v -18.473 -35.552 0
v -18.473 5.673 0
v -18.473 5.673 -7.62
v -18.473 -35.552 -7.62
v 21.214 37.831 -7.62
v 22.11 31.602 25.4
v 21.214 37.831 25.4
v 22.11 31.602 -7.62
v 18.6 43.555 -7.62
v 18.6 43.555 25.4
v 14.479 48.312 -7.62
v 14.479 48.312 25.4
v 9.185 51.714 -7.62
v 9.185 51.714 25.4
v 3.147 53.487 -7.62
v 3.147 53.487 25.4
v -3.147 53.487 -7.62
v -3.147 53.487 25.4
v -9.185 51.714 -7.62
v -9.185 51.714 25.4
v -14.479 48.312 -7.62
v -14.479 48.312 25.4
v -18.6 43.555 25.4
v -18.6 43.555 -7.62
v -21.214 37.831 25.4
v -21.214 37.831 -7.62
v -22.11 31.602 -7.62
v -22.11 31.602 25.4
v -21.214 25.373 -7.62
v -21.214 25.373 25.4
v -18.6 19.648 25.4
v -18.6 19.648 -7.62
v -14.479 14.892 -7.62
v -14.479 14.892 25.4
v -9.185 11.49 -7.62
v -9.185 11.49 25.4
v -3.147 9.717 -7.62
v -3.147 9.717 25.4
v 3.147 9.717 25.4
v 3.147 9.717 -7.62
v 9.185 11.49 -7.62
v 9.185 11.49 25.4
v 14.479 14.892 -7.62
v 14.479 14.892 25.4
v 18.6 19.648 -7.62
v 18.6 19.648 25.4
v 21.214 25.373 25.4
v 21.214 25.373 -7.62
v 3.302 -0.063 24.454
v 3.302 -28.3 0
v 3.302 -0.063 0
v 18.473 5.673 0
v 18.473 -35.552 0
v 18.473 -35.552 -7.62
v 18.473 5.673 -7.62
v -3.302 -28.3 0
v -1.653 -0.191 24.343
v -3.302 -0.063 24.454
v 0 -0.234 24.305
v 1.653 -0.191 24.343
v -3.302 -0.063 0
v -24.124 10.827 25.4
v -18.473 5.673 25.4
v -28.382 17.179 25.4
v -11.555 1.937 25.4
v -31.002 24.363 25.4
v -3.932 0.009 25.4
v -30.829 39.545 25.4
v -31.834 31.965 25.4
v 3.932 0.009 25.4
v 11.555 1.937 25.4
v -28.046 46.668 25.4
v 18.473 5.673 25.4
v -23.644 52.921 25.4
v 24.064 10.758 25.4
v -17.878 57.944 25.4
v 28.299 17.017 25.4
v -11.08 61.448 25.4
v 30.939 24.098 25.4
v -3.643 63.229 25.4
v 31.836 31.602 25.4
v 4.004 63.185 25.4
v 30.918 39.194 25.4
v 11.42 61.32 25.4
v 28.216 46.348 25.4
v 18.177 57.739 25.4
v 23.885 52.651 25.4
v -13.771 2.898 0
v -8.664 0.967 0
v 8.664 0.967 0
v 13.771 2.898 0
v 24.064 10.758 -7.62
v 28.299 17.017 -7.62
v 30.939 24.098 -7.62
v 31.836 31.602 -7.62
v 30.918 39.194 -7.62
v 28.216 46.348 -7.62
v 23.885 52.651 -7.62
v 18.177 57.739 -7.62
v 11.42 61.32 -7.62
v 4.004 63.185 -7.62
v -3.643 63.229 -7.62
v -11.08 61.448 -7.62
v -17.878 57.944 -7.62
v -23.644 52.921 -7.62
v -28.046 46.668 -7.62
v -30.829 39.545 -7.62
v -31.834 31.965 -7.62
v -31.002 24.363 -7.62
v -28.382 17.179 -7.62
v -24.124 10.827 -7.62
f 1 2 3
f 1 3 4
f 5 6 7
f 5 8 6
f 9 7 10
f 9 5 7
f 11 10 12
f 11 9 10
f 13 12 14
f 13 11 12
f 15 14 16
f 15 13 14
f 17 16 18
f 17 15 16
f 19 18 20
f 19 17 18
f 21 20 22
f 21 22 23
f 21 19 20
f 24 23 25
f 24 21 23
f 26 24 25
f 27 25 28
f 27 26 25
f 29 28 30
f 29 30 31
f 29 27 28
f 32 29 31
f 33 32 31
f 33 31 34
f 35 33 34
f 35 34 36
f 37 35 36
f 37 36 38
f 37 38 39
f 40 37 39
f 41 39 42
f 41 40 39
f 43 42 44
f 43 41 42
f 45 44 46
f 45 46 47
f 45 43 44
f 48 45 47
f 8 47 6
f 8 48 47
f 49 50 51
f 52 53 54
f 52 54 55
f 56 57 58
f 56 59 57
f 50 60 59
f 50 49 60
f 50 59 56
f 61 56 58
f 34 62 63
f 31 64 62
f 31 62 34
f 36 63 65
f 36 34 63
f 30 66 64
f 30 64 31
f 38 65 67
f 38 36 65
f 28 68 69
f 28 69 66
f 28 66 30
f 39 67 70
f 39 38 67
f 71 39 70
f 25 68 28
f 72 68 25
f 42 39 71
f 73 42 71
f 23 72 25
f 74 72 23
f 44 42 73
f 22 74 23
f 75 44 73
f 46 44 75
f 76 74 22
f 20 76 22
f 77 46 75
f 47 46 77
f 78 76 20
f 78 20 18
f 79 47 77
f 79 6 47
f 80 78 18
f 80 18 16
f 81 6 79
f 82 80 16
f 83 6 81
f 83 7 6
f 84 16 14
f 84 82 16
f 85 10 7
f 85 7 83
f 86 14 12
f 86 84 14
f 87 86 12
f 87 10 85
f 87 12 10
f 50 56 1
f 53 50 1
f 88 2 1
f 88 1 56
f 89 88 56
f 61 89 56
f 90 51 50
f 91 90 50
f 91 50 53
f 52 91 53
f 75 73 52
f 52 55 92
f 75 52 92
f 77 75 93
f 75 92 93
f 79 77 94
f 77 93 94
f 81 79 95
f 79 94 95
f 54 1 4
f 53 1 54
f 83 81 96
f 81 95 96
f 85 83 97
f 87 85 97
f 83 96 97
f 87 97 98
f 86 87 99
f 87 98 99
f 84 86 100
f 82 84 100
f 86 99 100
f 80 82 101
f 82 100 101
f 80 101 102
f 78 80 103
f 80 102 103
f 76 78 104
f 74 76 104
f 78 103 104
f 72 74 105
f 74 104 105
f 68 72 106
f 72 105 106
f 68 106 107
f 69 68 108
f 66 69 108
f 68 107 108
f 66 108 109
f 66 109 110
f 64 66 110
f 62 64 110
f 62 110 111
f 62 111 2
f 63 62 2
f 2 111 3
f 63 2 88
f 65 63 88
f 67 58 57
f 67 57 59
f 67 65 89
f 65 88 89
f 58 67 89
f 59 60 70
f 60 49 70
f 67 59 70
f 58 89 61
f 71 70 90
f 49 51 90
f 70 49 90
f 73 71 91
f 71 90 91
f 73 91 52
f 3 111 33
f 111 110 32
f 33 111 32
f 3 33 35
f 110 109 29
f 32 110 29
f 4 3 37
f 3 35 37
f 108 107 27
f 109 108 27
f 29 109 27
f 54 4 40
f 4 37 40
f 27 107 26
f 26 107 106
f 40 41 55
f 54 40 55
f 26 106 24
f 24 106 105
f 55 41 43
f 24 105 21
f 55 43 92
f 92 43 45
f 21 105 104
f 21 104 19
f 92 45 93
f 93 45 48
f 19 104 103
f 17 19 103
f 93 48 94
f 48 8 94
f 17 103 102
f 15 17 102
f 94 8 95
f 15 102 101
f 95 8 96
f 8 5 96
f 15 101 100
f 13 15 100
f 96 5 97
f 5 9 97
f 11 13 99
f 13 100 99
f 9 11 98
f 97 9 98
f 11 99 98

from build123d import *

# Parameters (mm, degrees)
F0_R     = 22.110067
F1_DEPTH = 7.62
F2_DEPTH = 25.4
F4_DEPTH = 3.302


with BuildPart() as f1:
    # F0 (on Top) → F1 (new body)
    with BuildSketch(Plane.XY):
        with BuildLine():
            ThreePointArc((18.473424, 5.673436), (28.299088, 17.017198), (31.836316, 31.601869))
            ThreePointArc((31.836316, 31.601869), (-14.584671, 59.900956), (-18.473424, 5.673436))
            ThreePointArc((-18.473424, 5.673436), (0, -0.234447), (18.473424, 5.673436))
        make_face()
        with Locations((0, 31.601869)):
            Circle(F0_R, mode=Mode.SUBTRACT)
        with BuildLine():
            ThreePointArc((18.473424, 5.673436), (0, -0.234447), (-18.473424, 5.673436))
            Line((-18.473424, 5.673436), (-18.473424, -35.552085))
            Line((-18.473424, -35.552085), (0, -35.552085))
            Line((0, -35.552085), (18.473424, -35.552085))
            Line((18.473424, -35.552085), (18.473424, 5.673436))
        make_face()
    extrude(amount=-F1_DEPTH)

    # F0 (on Top) → F2 (join)
    with BuildSketch(Plane.XY):
        with BuildLine():
            ThreePointArc((18.473424, 5.673436), (28.299088, 17.017198), (31.836316, 31.601869))
            ThreePointArc((31.836316, 31.601869), (-14.584671, 59.900956), (-18.473424, 5.673436))
            ThreePointArc((-18.473424, 5.673436), (0, -0.234447), (18.473424, 5.673436))
        make_face()
        with Locations((0, 31.601869)):
            Circle(F0_R, mode=Mode.SUBTRACT)
    extrude(amount=F2_DEPTH)

    # F3 (on Right) → F4 (join, symmetric)
    with BuildSketch(Plane.YZ):
        Polygon((0, 24.508493), (-28.300449, 0), (3.349552, 0), (3.349552, 24.508493), align=None)
    extrude(amount=F4_DEPTH, both=True)


solid = f1.part
